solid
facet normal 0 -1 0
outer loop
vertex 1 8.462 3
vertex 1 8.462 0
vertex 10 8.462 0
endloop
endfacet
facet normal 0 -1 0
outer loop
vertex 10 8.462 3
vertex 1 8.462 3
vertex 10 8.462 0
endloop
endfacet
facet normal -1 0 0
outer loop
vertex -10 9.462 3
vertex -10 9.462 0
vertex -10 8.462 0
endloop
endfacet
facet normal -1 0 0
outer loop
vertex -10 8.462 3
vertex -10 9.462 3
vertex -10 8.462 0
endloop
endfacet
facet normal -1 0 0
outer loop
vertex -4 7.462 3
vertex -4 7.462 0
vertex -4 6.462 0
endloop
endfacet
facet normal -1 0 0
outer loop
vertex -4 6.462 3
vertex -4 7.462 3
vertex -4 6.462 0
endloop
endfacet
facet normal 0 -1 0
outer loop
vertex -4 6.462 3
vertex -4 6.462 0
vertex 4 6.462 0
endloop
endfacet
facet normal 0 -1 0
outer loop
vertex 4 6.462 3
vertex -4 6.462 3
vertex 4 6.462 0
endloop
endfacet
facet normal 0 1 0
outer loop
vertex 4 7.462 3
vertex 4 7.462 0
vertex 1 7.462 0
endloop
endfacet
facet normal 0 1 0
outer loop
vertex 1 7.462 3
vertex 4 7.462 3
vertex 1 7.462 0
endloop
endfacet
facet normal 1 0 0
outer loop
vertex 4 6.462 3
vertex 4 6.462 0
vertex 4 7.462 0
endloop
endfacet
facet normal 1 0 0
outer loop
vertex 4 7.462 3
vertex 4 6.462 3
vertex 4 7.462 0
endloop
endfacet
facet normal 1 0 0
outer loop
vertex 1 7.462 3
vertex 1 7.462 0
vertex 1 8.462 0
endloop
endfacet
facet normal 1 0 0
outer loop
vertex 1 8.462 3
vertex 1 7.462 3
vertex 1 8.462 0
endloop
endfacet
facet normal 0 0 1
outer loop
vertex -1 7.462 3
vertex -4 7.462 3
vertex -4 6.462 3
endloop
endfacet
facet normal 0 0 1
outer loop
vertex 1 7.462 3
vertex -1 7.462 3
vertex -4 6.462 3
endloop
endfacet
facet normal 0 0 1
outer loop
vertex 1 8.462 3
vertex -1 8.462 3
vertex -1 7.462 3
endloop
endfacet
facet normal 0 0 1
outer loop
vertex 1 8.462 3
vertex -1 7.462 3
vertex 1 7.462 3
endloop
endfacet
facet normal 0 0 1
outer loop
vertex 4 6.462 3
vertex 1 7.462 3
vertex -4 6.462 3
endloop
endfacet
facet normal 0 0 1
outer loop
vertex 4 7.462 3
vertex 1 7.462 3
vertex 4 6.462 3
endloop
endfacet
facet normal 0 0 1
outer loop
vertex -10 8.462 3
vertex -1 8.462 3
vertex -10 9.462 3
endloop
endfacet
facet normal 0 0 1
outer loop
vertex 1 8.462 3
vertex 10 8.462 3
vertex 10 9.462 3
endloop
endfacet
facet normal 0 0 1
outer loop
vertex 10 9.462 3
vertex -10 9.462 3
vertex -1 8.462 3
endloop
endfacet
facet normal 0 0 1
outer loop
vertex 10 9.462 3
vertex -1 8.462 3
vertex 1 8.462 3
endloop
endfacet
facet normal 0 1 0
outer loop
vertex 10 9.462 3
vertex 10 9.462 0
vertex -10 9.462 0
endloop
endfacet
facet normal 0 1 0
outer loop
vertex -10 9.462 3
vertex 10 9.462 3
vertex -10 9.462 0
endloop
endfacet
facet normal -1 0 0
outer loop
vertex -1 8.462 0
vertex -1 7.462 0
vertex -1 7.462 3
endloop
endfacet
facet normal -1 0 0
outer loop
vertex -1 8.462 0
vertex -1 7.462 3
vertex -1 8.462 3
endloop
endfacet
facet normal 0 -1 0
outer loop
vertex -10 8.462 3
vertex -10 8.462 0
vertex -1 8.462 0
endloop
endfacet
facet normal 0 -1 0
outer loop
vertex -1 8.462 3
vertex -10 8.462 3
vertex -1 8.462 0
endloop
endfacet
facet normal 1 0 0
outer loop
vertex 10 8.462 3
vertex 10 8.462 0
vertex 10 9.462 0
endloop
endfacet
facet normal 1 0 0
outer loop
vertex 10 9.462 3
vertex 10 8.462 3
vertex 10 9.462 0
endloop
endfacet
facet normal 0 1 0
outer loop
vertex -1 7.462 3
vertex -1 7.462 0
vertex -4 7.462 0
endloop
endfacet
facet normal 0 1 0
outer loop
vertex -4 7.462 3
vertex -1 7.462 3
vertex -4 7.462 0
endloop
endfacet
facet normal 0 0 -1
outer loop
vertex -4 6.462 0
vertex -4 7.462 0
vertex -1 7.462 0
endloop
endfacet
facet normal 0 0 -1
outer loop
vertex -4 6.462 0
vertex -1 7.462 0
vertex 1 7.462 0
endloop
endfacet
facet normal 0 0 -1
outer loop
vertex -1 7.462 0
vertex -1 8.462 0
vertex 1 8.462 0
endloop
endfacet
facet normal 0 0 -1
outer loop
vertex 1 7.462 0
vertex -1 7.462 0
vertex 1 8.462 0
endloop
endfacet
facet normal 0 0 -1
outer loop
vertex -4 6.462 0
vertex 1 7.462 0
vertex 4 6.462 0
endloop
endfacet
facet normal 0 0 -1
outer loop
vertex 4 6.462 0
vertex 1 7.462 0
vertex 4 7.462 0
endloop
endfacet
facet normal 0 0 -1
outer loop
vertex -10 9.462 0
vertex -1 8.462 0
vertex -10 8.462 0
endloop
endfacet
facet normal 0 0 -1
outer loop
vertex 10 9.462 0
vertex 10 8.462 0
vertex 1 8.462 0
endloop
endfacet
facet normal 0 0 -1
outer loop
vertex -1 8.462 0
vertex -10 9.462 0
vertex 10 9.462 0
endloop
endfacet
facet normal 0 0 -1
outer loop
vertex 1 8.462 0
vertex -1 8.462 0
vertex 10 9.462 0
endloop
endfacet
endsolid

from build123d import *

# Parameters (mm, degrees)
F0_W     = 1
F0_H     = 1
F1_DEPTH = 3


with BuildPart() as f1:
    # F0 (on Top) → F1 (new body)
    with BuildSketch(Plane.XY):
        Polygon((0, 9.461539), (-10, 9.461539), (-10, 8.461539), (-1, 8.461539), (0, 8.461539), align=None)
        Polygon((10, 9.461539), (0, 9.461539), (0, 8.461539), (1, 8.461539), (10, 8.461539), align=None)
        with Locations((-0.5, 7.961539)):
            Rectangle(F0_W, F0_H)
        with Locations((0.5, 7.961539)):
            Rectangle(F0_W, F0_H)
        Polygon((0, 6.461539), (0, 7.461539), (-1, 7.461539), (-4, 7.461539), (-4, 6.461539), align=None)
        Polygon((1, 7.461539), (0, 7.461539), (0, 6.461539), (4, 6.461539), (4, 7.461539), align=None)
    extrude(amount=F1_DEPTH)


solid = f1.part
